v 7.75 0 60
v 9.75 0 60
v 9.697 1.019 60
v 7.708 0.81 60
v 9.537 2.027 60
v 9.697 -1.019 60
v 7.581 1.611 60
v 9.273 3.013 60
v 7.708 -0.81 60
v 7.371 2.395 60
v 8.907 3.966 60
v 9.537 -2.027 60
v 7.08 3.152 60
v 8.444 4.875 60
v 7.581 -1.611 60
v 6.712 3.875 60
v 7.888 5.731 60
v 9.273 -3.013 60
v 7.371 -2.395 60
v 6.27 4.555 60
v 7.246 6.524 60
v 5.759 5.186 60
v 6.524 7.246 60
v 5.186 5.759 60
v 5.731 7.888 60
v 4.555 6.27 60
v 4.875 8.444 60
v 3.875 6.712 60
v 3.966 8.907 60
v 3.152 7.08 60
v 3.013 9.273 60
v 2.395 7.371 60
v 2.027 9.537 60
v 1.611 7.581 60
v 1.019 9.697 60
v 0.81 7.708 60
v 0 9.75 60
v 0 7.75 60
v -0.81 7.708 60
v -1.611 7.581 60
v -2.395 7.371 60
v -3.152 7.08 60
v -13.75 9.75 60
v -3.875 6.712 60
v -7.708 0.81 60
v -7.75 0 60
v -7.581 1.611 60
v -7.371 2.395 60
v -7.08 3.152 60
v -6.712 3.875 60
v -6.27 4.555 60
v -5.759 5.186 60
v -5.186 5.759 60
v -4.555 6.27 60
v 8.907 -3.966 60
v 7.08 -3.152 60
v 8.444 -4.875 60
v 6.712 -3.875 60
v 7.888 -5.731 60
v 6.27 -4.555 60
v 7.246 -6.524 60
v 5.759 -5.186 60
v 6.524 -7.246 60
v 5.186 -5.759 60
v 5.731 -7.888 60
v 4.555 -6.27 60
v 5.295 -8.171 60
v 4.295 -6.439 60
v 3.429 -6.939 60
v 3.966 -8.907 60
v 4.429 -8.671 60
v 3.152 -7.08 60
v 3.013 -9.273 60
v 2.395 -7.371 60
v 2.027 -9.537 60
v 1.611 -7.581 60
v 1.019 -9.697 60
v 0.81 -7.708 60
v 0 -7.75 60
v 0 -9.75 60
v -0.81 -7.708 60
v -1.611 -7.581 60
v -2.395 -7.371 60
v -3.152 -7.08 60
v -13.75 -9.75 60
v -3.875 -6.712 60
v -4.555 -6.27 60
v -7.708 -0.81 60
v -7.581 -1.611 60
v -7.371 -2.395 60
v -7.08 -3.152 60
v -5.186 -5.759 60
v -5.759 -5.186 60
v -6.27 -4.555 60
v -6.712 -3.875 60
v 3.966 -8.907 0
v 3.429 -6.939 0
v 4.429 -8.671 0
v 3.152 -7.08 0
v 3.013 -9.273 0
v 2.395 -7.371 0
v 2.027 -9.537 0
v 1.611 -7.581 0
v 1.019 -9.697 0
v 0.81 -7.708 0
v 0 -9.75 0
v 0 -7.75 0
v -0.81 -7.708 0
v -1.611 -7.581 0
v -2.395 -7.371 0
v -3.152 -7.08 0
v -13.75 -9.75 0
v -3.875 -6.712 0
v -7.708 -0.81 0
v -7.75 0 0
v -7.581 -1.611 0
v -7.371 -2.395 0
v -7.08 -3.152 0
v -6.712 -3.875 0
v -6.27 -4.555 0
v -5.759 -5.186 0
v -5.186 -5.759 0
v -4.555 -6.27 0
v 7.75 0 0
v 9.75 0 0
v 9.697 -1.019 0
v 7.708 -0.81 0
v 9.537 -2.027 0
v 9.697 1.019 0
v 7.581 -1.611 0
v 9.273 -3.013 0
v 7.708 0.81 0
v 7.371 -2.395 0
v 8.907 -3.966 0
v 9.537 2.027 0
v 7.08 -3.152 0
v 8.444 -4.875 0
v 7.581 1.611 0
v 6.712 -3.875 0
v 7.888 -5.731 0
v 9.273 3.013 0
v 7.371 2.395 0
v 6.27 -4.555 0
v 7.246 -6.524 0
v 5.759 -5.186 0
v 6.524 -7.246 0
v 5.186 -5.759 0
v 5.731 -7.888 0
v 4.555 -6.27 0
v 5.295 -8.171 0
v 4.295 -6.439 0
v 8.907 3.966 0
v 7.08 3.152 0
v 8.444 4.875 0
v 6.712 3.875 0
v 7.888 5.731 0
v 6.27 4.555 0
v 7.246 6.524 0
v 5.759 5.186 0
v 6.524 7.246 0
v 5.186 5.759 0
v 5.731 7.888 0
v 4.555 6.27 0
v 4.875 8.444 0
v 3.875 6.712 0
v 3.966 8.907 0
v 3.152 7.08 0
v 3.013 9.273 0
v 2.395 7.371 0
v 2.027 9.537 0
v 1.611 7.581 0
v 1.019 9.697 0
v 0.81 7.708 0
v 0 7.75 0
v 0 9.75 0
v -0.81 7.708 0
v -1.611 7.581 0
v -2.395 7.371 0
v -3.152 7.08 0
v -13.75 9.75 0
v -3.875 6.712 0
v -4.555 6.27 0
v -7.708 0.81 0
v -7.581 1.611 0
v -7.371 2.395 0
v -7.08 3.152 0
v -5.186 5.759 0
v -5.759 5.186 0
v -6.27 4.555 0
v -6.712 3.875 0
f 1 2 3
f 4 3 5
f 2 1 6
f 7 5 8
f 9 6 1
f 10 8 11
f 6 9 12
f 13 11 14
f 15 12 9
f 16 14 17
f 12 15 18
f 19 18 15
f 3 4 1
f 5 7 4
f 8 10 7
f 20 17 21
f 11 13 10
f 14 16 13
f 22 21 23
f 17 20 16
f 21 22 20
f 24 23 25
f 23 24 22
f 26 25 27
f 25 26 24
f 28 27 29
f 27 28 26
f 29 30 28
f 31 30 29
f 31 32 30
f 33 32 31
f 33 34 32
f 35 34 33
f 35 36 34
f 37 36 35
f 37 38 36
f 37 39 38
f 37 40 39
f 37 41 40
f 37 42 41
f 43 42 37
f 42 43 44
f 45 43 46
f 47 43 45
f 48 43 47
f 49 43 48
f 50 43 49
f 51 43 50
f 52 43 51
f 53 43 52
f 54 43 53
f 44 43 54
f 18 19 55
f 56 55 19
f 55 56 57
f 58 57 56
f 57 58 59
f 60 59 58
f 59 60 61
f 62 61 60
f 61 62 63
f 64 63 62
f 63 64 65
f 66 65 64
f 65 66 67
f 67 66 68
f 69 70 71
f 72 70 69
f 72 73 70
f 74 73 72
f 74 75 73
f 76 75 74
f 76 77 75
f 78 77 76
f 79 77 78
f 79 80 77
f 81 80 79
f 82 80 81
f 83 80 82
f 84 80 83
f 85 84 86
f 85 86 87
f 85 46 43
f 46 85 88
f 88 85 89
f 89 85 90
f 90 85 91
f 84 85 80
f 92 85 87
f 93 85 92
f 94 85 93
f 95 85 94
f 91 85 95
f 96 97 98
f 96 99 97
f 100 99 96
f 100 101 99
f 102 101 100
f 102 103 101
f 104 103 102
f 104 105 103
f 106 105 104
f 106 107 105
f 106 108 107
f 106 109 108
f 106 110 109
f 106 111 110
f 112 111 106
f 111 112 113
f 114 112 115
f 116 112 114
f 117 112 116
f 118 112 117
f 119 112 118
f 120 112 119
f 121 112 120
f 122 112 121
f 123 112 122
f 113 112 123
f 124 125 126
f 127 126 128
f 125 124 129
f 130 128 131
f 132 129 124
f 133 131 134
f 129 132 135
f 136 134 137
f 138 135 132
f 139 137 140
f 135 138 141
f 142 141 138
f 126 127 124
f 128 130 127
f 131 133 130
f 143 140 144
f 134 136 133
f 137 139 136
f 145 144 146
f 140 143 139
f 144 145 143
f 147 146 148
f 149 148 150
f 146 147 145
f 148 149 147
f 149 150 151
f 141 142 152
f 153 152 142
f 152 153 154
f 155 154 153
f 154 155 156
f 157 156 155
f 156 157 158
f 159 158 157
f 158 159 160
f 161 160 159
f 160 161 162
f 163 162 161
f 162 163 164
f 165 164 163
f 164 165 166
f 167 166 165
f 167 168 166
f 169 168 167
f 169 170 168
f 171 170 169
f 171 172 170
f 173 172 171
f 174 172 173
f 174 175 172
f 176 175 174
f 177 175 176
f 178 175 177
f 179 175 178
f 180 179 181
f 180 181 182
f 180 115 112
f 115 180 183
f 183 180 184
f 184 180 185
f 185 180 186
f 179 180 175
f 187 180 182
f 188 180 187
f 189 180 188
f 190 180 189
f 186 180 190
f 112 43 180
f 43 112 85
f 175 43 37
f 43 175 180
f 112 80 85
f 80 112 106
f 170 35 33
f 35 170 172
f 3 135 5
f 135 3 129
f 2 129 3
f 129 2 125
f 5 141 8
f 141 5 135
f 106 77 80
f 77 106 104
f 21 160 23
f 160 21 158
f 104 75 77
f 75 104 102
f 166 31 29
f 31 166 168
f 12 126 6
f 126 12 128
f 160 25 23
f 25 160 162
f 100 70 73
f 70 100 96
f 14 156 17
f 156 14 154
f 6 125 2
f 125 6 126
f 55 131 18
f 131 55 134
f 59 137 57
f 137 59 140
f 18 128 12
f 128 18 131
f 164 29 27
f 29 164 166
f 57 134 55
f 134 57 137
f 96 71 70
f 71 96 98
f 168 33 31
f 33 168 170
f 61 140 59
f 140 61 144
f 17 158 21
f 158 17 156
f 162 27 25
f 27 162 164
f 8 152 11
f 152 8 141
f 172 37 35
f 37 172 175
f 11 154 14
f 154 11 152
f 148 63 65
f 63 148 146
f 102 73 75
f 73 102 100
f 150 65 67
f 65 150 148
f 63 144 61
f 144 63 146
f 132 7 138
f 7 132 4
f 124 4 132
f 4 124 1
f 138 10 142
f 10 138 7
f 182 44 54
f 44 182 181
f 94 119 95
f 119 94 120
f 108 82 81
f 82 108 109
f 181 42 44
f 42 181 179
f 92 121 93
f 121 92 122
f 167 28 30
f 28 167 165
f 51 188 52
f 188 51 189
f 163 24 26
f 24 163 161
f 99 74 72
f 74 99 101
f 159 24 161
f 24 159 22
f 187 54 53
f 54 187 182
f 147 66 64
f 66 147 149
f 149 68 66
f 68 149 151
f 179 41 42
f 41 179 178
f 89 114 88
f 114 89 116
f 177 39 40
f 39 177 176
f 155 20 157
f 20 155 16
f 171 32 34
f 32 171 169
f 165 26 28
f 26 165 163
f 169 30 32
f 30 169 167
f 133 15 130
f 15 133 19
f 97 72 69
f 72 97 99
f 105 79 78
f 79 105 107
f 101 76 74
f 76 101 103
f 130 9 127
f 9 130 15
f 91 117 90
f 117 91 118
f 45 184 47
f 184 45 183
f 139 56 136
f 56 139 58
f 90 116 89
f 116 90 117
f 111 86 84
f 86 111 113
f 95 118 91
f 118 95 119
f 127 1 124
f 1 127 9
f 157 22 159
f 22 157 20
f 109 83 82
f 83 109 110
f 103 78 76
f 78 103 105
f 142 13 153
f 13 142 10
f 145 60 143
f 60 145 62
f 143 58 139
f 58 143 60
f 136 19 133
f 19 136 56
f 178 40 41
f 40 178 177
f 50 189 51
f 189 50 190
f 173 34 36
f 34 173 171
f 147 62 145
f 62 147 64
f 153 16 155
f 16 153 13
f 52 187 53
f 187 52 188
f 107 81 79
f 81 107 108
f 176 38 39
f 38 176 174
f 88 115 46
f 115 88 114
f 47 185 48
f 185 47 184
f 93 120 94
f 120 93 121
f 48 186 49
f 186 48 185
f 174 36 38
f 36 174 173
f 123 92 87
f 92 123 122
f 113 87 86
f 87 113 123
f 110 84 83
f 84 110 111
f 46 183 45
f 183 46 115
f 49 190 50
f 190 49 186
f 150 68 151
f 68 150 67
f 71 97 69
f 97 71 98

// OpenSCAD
// file: ../../../inc/metric.scad
// PRUSA iteration3
// Default metric sizes
// GNU GPL v3
// Josef Průša <josefprusa@me.com>
// http://www.reprap.org/wiki/Prusa_Mendel
// http://github.com/prusajr/PrusaMendel

// DONT CHANGE THIS FILE! ALTER VALUES IN CONFIGURATION.SCAD INSTEAD

// Bearings
linear_bearing_diameter = 15.5;

// RODS

threaded_rod_diameter = 8.7;
threaded_rod_diameter_horizontal = 8.7;
smooth_bar_diameter = 8.3;
smooth_bar_diameter_horizontal = 8.2;

// Nuts and bolts


m8_diameter = 9;
//iso4032 says Width across corners = 14.38
m8_nut_diameter = 14.1;

m5_diameter = 6;
m5_nut_diameter = 9.8;


m4_diameter = 4.7;
//iso4032 says 7.66
m4_nut_diameter = 7.6;
m4_nut_diameter_horizontal = 8;

m3_diameter = 3.6;
//iso4032 says 6.01
m3_nut_diameter = 5.3;
m3_nut_diameter_horizontal = 6.8;
m3_washer_diameter = 6.9;

// Motors

motor_shaft = 5.5;
// main file
// PRUSA iteration3
// Bearing holders
// GNU GPL v3
// Josef Průša <iam@josefprusa.cz> and contributors
// http://www.reprap.org/wiki/Prusa_Mendel
// http://prusamendel.org

include <../../../inc/metric.scad>

module horizontal_bearing_base(bearings=1){
 translate(v=[0,0,6]) cube(size = [24,8+bearings*25,12], center = true);	
}
module horizontal_bearing_holes(bearings=1){
 cutter_lenght = 10+bearings*25;
 one_holder_lenght = 8+25;
 holder_lenght = 8+bearings*25;
 
 // Main bearing cut
 difference(){
  translate(v=[0,0,12+1.5]) rotate(a=[90,0,0]) translate(v=[0,0,-cutter_lenght/2]) cylinder(h = cutter_lenght, r=linear_bearing_diameter/2, $fn=50);
  // Bearing retainers
  translate(v=[0,1-holder_lenght/2,3+1.5]) cube(size = [24,6,8], center = true);
  translate(v=[0,-1+holder_lenght/2,3+1.5]) cube(size = [24,6,8], center = true);
 }
 
 // Ziptie cutouts
 ziptie_cut_ofset = 0;
 for ( i = [0 : bearings-1] ){
  // For easier positioning I move them by half of one 
  // bearing holder then add each bearign lenght and then center again
  translate(v=[0,-holder_lenght/2,0]) translate(v=[0,one_holder_lenght/2+i*25,0]) difference(){
   union(){
    translate(v=[0,2-6,12]) rotate(a=[90,0,0]) translate(v=[0,0,0]) cylinder(h = 4, r=12.5, $fn=50);
    translate(v=[0,2+6,12]) rotate(a=[90,0,0]) translate(v=[0,0,0]) cylinder(h = 4, r=12.5, $fn=50);
   }
   translate(v=[0,10,12]) rotate(a=[90,0,0]) translate(v=[0,0,0]) cylinder(h = 24, r=10, $fn=50);
  }
 }
 
}

module horizontal_bearing_test(){
 difference(){
  horizontal_bearing_base(1);
  horizontal_bearing_holes(1);
 }
 translate(v=[30,0,0]) difference(){
  horizontal_bearing_base(2);
  horizontal_bearing_holes(2);
 }
 translate(v=[60,0,0]) difference(){
  horizontal_bearing_base(3);
  horizontal_bearing_holes(3);
 }
}



thinwall = 2;
bearing_size = linear_bearing_diameter + 2 * thinwall;

module vertical_bearing_base(){
 translate(v=[-2-bearing_size/4,0,30]) cube(size = [4+bearing_size/2,bearing_size,60], center = true);
 cylinder(h = 60, r=bearing_size/2, $fn = 60);
}

module vertical_bearing_holes(){
  translate(v=[0,0,-1]) cylinder(h = 62, r=linear_bearing_diameter/2, $fn = 60);
  rotate(a=[0,0,-60]) translate(v=[10,0,31]) cube(size = [10,1,62], center = true);
}

difference(){
vertical_bearing_base();
vertical_bearing_holes();
}
